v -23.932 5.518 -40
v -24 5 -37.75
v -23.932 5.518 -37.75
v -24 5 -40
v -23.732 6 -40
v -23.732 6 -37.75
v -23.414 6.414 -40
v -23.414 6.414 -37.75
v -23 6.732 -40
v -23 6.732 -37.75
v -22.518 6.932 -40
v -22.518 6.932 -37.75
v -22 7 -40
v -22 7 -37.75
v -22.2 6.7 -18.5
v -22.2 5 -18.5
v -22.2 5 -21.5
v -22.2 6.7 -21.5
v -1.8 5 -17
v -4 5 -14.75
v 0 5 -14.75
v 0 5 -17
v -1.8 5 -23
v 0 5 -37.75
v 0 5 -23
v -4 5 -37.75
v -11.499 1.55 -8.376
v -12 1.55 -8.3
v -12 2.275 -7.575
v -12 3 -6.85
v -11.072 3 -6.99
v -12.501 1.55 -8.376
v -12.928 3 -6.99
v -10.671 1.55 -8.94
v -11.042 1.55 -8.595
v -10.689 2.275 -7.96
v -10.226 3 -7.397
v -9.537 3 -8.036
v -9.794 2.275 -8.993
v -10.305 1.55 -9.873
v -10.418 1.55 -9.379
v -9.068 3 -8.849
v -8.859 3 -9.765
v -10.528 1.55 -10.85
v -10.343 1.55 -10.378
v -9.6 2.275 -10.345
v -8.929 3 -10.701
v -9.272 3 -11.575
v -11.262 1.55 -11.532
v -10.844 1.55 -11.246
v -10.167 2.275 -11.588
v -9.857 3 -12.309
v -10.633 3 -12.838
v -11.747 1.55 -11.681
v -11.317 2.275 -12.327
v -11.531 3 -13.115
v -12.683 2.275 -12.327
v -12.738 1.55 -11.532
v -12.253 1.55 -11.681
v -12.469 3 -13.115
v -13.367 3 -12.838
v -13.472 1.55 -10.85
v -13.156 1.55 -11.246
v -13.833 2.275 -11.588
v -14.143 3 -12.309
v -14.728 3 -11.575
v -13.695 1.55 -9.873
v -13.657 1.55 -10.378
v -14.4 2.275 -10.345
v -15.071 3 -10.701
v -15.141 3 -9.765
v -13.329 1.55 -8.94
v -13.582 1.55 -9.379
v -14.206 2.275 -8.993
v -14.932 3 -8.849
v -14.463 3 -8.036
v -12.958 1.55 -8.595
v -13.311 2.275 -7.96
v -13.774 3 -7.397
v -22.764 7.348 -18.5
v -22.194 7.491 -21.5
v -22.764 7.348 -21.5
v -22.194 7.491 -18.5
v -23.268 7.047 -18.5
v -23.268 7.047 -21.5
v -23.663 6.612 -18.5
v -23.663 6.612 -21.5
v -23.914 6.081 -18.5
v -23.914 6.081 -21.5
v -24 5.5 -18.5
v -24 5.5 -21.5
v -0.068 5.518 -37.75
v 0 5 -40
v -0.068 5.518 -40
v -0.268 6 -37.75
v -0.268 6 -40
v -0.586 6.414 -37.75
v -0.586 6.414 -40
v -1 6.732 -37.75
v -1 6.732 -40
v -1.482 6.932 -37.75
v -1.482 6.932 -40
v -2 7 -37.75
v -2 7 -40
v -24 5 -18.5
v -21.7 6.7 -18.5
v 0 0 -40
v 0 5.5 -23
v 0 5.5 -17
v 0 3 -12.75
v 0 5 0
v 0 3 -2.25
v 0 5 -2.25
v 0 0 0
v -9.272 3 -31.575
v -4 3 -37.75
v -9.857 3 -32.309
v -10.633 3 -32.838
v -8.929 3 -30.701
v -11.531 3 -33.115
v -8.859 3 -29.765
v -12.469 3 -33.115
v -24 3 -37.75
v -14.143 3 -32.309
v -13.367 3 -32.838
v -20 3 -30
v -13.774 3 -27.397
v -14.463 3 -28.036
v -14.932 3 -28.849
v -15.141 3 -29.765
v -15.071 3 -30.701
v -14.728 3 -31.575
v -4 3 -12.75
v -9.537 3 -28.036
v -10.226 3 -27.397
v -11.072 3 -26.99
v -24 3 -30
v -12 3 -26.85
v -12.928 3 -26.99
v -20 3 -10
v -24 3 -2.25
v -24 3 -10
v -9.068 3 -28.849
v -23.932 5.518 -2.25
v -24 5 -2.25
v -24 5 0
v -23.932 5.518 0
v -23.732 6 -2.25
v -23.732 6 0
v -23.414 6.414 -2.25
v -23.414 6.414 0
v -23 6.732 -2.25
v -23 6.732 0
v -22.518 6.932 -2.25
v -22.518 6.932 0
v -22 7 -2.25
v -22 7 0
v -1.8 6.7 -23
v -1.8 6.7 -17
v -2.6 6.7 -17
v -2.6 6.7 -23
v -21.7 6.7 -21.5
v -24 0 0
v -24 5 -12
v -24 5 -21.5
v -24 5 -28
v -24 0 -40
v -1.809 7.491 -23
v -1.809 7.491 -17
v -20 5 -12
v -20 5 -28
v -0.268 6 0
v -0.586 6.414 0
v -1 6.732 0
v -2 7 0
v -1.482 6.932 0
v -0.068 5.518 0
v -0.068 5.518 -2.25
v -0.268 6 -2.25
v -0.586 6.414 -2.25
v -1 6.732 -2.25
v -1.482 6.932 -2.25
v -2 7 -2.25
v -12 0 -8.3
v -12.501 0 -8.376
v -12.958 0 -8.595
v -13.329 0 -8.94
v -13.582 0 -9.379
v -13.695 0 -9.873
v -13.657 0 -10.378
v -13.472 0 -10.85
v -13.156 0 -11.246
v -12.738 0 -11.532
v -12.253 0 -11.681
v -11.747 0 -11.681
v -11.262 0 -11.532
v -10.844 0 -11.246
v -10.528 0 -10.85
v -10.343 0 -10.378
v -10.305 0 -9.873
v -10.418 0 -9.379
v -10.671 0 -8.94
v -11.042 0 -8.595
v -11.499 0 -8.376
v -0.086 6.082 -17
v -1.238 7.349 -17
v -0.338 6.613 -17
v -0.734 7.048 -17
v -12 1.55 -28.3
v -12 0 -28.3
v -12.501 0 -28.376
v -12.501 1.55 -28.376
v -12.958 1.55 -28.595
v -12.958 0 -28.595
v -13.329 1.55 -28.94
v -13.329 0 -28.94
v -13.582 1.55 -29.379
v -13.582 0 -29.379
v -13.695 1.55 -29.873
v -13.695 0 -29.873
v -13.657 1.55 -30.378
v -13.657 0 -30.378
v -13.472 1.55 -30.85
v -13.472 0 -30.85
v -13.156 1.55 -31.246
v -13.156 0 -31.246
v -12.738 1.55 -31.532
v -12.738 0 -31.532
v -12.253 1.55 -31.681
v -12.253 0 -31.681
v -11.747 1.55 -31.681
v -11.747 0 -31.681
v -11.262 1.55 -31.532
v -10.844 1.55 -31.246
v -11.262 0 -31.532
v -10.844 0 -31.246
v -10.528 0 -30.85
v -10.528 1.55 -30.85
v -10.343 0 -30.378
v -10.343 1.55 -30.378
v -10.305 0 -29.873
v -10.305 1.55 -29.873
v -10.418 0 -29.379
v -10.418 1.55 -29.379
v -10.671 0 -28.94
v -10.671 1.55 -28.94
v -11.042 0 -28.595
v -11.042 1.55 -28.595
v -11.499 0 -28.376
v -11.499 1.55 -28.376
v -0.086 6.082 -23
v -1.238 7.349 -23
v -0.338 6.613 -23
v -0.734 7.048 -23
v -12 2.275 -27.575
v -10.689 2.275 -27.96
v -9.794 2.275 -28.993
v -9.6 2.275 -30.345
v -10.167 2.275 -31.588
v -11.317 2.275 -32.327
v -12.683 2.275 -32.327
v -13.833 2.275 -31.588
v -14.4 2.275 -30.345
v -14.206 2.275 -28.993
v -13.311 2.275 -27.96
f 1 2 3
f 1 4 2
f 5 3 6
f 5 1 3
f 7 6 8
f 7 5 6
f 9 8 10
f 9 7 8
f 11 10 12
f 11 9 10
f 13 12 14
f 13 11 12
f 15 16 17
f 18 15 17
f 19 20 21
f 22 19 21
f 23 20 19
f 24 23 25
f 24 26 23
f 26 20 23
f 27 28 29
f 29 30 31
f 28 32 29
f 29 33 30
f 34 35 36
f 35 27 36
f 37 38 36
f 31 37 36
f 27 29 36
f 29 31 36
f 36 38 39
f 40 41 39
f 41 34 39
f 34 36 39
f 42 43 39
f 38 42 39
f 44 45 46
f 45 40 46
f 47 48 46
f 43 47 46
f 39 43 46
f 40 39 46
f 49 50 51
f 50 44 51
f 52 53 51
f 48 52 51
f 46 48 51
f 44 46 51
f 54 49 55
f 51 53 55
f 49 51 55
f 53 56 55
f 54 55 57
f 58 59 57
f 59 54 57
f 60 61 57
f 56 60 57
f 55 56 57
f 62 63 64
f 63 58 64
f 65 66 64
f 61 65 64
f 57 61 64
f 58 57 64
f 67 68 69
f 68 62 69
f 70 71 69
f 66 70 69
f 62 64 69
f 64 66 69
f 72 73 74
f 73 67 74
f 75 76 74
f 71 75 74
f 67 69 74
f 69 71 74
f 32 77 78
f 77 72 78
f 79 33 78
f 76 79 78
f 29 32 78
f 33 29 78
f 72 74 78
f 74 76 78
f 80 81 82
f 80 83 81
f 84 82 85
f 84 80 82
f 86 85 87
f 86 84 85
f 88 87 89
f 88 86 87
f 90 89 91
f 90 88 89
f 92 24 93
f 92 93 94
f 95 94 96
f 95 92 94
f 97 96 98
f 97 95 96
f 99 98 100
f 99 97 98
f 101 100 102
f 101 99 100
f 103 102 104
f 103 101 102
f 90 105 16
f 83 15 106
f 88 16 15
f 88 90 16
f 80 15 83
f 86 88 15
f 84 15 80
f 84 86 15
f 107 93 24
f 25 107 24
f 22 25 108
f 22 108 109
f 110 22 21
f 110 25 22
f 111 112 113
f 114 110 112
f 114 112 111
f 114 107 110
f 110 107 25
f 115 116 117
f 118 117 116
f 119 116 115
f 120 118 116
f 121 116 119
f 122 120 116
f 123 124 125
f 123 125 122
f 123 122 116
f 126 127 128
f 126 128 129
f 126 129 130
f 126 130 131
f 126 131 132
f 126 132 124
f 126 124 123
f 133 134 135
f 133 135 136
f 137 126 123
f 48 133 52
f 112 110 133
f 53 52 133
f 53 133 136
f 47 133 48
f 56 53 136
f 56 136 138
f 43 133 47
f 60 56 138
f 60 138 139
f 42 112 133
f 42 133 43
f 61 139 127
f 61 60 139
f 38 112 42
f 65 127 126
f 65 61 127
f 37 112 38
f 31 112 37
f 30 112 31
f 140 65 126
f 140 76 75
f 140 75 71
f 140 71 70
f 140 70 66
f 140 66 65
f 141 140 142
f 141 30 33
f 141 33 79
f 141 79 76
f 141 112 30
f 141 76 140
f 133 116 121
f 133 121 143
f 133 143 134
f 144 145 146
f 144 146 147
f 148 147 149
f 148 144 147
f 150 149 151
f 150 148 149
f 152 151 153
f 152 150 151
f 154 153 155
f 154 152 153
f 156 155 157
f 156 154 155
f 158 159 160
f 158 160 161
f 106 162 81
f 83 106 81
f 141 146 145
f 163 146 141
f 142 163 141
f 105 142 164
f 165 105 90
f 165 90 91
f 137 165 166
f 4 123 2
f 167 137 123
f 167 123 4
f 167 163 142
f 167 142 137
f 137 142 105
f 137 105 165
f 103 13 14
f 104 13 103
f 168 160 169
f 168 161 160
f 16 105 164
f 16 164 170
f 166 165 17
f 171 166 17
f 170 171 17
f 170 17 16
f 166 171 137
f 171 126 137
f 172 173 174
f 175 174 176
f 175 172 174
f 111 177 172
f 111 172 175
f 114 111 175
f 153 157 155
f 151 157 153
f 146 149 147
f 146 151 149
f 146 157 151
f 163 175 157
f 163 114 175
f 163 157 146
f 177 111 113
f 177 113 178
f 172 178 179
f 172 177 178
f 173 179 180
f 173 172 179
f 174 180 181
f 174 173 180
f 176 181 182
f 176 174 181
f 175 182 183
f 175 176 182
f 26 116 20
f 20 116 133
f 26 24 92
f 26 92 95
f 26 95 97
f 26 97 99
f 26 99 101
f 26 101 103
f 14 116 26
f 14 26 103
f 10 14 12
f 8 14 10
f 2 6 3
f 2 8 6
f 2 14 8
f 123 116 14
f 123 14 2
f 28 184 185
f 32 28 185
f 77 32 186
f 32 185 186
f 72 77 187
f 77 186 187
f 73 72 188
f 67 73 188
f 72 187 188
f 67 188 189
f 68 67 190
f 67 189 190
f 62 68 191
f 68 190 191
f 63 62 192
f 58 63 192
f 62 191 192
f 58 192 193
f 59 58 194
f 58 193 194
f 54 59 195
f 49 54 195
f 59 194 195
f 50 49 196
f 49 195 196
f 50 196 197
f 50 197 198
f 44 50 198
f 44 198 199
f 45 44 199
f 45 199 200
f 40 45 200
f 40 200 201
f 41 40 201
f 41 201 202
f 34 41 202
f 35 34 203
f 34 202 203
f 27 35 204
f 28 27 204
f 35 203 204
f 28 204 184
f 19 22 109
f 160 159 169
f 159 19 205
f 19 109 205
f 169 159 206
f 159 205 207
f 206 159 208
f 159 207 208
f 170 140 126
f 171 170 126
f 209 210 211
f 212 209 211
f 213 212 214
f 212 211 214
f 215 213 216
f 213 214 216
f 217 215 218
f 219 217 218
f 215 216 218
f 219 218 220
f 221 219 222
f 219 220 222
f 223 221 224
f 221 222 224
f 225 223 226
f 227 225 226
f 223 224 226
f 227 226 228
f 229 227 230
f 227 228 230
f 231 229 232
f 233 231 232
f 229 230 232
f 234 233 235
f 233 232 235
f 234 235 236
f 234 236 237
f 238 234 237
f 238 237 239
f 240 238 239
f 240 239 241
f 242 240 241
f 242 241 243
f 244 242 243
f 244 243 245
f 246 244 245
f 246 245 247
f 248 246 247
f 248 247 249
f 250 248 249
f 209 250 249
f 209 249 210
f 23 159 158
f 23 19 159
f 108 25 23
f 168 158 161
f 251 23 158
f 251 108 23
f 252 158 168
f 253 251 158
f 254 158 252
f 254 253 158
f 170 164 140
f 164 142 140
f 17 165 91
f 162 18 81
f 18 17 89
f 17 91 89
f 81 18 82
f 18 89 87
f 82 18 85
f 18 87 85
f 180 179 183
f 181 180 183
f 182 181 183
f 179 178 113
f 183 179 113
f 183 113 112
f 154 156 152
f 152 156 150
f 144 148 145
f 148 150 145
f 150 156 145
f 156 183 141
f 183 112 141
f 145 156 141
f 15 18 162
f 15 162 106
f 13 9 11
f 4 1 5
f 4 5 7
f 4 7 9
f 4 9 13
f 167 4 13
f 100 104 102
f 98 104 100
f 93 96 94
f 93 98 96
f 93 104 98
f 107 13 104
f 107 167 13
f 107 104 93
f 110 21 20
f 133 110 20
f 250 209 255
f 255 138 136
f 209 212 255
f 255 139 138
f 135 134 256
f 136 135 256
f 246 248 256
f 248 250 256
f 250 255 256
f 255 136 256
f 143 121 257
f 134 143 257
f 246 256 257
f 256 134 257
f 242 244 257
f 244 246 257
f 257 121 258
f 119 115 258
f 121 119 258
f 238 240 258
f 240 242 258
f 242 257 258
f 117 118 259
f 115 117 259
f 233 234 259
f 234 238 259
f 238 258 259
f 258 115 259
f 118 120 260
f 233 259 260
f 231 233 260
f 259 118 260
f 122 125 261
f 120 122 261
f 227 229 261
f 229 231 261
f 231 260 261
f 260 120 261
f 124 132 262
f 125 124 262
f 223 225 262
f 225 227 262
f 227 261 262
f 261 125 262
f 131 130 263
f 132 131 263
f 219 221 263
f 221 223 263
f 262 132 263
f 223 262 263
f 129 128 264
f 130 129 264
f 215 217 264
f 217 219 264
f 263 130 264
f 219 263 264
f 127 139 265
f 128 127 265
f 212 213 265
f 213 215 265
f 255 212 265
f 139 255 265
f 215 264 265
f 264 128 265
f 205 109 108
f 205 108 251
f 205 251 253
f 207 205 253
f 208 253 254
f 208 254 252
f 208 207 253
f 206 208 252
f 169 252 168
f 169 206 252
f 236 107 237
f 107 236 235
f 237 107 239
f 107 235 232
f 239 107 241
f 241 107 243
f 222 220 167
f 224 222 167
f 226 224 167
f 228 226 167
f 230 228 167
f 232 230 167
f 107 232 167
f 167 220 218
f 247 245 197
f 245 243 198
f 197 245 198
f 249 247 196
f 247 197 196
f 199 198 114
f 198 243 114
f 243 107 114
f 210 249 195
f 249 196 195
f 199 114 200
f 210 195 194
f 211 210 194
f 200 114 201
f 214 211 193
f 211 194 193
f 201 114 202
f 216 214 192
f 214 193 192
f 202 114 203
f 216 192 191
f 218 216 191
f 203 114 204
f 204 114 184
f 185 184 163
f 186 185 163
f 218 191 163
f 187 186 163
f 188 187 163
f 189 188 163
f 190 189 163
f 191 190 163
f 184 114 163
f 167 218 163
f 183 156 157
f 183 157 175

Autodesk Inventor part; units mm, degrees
ref_plane "YZ Plane" through (0, 0, 0) normal (1, 0, 0) x (0, 1, 0)
ref_plane "XZ Plane" through (0, 0, 0) normal (0, 1, 0) x (-1, 0, 0)
ref_plane "XY Plane" through (0, 0, 0) normal (0, 0, 1) x (1, 0, 0)
sketch "Skizze1" plane through (0, 0, 0) normal (0, 1, 0) x (-1, 0, 0)
  line L0 (0, 0) -> (24, 0)
  line L1 (24, 0) -> (24, -40)
  line L2 (24, -40) -> (0, -40)
  line L3 (0, -40) -> (0, 0)
  dimension "d0" = 40
  dimension "d1" = 24
extrude "Extrusion1" add sketch "Skizze1" along normal blind 3
sketch "Skizze2" plane through (0, 3, 0) normal (0, 1, 0) x (1, 0, 0)
  line L0 (-24, 40) -> (-24, 0) projected
  line L1 (0, 0) -> (0, 40) projected
  line L2 (-24, 0) -> (0, 0)
  line L3 (0, 0) -> (0, 2.25)
  line L4 (0, 2.25) -> (-24, 2.25)
  line L5 (-24, 2.25) -> (-24, 0)
  line L6 (0, 40) -> (-24, 40) projected
  line L7 (-24, 40) -> (0, 40)
  line L8 (0, 40) -> (0, 37.75)
  line L9 (0, 37.75) -> (-24, 37.75)
  line L10 (-24, 37.75) -> (-24, 40)
  dimension "d4" = 2.25
  dimension "d5" = 2.25
extrude "Extrusion2" add sketch "Skizze2" along normal blind 4 contours L6 L1 L9 L0 | L4 L1 L2 L0
sketch "Skizze4" plane through (0, 3, 0) normal (0, 1, 0) x (1, 0, 0)
  line L0 (0, 2.25) -> (-24, 2.25) projected
  line L1 (0, 2.25) -> (-1.8184, 2.25)
  line L2 (0, 37.75) -> (-1.8184, 37.75)
  line L3 (-24.0183, 2.25) -> (-21.7244, 2.25)
  line L4 (-24, 37.75) -> (-21.1801, 37.75)
  line L5 (0, 37.75) -> (-4, 37.75)
  line L6 (-4, 37.75) -> (-4, 12.75)
  line L7 (-4, 12.75) -> (0, 12.75)
  line L8 (0, 12.75) -> (0, 37.75)
  line L9 (-24, 37.75) -> (-24, 2.25) projected
  line L10 (-24, 10) -> (-20, 10)
  line L11 (-20, 10) -> (-20, 30)
  line L12 (-20, 30) -> (-24, 30)
  line L13 (-24, 30) -> (-24, 10)
  line L14 (-24, 0) -> (0, 0) projected
  dimension "d25" = 25
  dimension "d26" = 4
  dimension "d27" = 4
  dimension "d29" = 20
  dimension "d30" = 10
extrude "Extrusion4" add sketch "Skizze4" along normal blind 2
sketch "Skizze5" plane through (0, 5, 0) normal (0, 1, 0) x (1, 0, 0)
  line L0 (-24, 30) -> (-24, 10) projected
  line L1 (-24, 20) -> (0, 20)
  line L2 (0, 0) -> (0, 40) projected
  line L3 (-24, 18.5) -> (-22.2, 18.5)
  line L4 (-22.2, 18.5) -> (-22.2, 21.5)
  line L5 (-22.2, 21.5) -> (-24, 21.5)
  line L6 (-24, 21.5) -> (-24, 18.5)
  line L7 (0, 17) -> (-1.8, 17)
  line L8 (-1.8, 17) -> (-1.8, 23)
  line L9 (-1.8, 23) -> (0, 23)
  line L10 (0, 23) -> (0, 17)
  point P0 (-23.1, 18.5)
  point P1 (0, 23)
  dimension "d33" = 3
  dimension "d34" = 1.8
  dimension "d35" = 1.8
  dimension "d36" = 6
extrude "Extrusion5" add sketch "Skizze5" along normal blind 2.5
sketch "Skizze6" plane through (-1.8, 5, -23) normal (-1, 0, 0) x (0, 0, 1)
  line L0 (0, 0) -> (0, 2.5) projected
  line L1 (6, 0) -> (6, 2.5) projected
  line L2 (0, 2.5) -> (6, 2.5)
  line L3 (6, 2.5) -> (6, 1.7)
  line L4 (6, 1.7) -> (0, 1.7)
  line L5 (0, 1.7) -> (0, 2.5)
  point P0 (23, -5)
  point P1 (0, 1.7)
  dimension "d39" = 0.8
extrude "Extrusion6" add sketch "Skizze6" along normal blind 1
sketch "Skizze7" plane through (0, 5, -23) normal (0, 0, -1) x (-1, 0, 0)
  line L0 (2.8, 2.5) -> (2.8, 1.7) projected
  line L1 (2.8, 1.5) -> (1.8, 2.5)
  line L2 (0, 2.5) -> (2.8, 2.5) projected
  line L3 (1.8, 2.5) -> (2.8, 2.5)
  line L4 (2.8, 2.5) -> (2.8, 1.5)
  point P0 (0, -5)
  dimension "d42" = 1
  dimension "d43" = 1
extrude "Extrusion7" cut sketch "Skizze7" against normal blind 10
sketch "Skizze9" plane through (-22.2, 5, -18.5) normal (1, 0, 0) x (0, 0, -1)
  line L0 (0, 0) -> (0, 2.5) projected
  line L1 (3, 0) -> (3, 2.5) projected
  line L2 (0, 2.5) -> (3, 2.5)
  line L3 (3, 2.5) -> (3, 1.7)
  line L4 (3, 1.7) -> (0, 1.7)
  line L5 (0, 1.7) -> (0, 2.5)
  line L6 (3, 0) -> (0, 0) projected
  point P0 (-18.5, -5)
  point P1 (0, 1.7)
  dimension "d46" = 1.7
extrude "Extrusion8" add sketch "Skizze9" along normal blind 0.5 contours L0 L2 L1 L4
sketch "Skizze11" plane through (-22.2, 5, -21.5) normal (0, 0, -1) x (-1, 0, 0)
  line L0 (-0.5, 2.5) -> (-0.5, 1.7)
  line L1 (-0.5, 1.7) -> (0, 2.5)
  line L2 (1.8, 2.5) -> (-0.5, 2.5) projected
  line L3 (-0.5, 1.7) -> (-0.5, 2.5) projected
  line L4 (-0.5, 2.5) -> (0, 2.5)
  point P0 (-22.2, -5)
  dimension "d49" = 0.5
extrude "Extrusion9" cut sketch "Skizze11" against normal blind 10
chamfer "Fasen1" distance 2 angle 45 3 edges at (-22, 5, -30) (-22, 5, -10) (-2, 5, -12.75)
fillet "Rundung1" radius 2 6 edges at (0, 7.5, -20) (-24, 7.5, -20) (-24, 7, -1.125) (0, 7, -1.125) (-24, 7, -38.875) (0, 7, -38.875)
sketch "Skizze12" plane through (0, 3, 0) normal (0, 1, 0) x (1, 0, 0)
  line L0 (-24, 0) -> (0, 0) projected
  line L1 (-12, 0) -> (-12, 40)
  line L2 (0, 40) -> (-24, 40) projected
  circle A0 centre (-12, 10) radius 2
  circle A1 centre (-12, 30) radius 2
  line L3 (-24, 40) -> (-24, 0) projected
  line L4 (-24, 20) -> (0, 20) construction
  line L5 (0, 17) -> (0, 23) projected
  dimension "d56" = 4
  dimension "d57" = 4
  dimension "d58" = 20
hole "Bohrung1" at (-12, 3, -10) at (-12, 3, -30) direction (0, -1, 0) diameter 3.4 depth 8.8 tip angle 118 countersink diameter 6.3 countersink angle 90 clearance for "Flachkopfsenkschraube ISO 2009/7046" size "M3" standard "ISO"
properties part number "Halter_Treiber_LED_2"
